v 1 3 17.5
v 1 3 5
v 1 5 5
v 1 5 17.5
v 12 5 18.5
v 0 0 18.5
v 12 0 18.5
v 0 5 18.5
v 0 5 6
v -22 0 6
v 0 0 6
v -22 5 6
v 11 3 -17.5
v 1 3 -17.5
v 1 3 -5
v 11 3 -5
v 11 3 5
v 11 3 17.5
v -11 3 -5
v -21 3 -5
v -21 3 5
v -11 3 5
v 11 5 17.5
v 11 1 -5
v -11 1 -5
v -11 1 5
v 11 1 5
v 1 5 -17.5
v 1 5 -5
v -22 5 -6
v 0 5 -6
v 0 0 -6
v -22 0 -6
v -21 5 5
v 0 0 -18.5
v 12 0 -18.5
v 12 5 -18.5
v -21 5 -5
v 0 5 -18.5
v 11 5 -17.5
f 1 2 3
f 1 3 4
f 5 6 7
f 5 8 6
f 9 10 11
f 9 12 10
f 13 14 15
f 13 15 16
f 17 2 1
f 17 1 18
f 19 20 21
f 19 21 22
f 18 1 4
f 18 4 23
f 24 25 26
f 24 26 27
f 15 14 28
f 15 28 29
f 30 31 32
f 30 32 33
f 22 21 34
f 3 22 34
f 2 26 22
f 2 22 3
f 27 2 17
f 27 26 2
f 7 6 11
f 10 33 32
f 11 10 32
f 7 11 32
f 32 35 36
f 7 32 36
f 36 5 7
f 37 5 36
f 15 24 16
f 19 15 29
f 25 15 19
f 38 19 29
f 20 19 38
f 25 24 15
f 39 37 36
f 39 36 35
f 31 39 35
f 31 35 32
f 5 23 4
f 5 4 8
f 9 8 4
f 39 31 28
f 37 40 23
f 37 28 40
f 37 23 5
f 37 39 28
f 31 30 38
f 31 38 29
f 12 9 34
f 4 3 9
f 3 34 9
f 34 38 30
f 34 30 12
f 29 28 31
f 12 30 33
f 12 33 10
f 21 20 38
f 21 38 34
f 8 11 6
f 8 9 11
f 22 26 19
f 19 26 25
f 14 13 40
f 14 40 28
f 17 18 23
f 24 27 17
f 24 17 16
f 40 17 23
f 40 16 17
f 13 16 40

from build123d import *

# Parameters (mm, degrees)
SKETCH_2_W           = 32
SKETCH_2_H           = 10
SKETCH_2_W_2         = 10
SKETCH_2_H_2         = 12.5
EXTRUDE_1_DEPTH      = 1
EXTRUDE_2_DEPTH      = 4
EXTRUDE_2_DEPTH_BACK = 1
SKETCH_4_W           = 10
SKETCH_4_H           = 10
SKETCH_4_H_2         = 12.5
EXTRUDE_3_DEPTH      = 2


with BuildPart() as part:
    # 草图2 → 凸台-拉伸1 (new body)
    with BuildSketch(Plane(origin=(0, 0, 0), x_dir=(1, 0, 0), z_dir=(0, 1, 0))):
        with Locations((-5, 0)):
            Rectangle(SKETCH_2_W, SKETCH_2_H)
        with Locations((6, 11.25)):
            Rectangle(SKETCH_2_W_2, SKETCH_2_H_2)
        with Locations((6, -11.25)):
            Rectangle(SKETCH_2_W_2, SKETCH_2_H_2)
    extrude(amount=EXTRUDE_1_DEPTH)

    # 草图3 → 凸台-拉伸2 (add, two sides)
    with BuildSketch(Plane(origin=(0, 1, 0), x_dir=(1, 0, 0), z_dir=(0, 1, 0))) as extrude_2_sk:
        Polygon((12, -18.5), (12, 18.5), (0, 18.5), (0, 6), (-22, 6), (-22, -6), (0, -6), (0, -18.5), align=None)
        Polygon((11, -17.5), (11, 17.5), (1, 17.5), (1, 5), (-21, 5), (-21, -5), (1, -5), (1, -17.5), align=None, mode=Mode.SUBTRACT)
    extrude(amount=EXTRUDE_2_DEPTH)
    extrude(extrude_2_sk.sketch, amount=-EXTRUDE_2_DEPTH_BACK)

    # 草图4 → 凸台-拉伸3 (add)
    with BuildSketch(Plane(origin=(0, 1, 0), x_dir=(1, 0, 0), z_dir=(0, 1, 0))):
        with Locations((-16, 0)):
            Rectangle(SKETCH_4_W, SKETCH_4_H)
        with Locations((6, 11.25)):
            Rectangle(SKETCH_4_W, SKETCH_4_H_2)
        with Locations((6, -11.25)):
            Rectangle(SKETCH_4_W, SKETCH_4_H_2)
    extrude(amount=EXTRUDE_3_DEPTH)


solid = part.part
